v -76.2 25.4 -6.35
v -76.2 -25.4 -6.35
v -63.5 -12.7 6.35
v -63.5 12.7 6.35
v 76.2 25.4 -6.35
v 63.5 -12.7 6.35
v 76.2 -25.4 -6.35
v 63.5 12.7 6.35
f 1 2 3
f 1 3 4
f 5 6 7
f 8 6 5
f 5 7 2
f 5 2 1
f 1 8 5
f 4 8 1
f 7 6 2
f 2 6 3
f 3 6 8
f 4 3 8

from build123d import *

# Parameters (mm, degrees)
F0_W     = 50.8
F0_H     = 12.7
F1_DEPTH = 76.2
F2_SIZE  = 12.69999


# Not quite as in the source:
# - a fillet or chamfer is up to 0.001 mm smaller than in the source, because OpenCascade refuses the exact size


with BuildPart() as f1:
    # F0 (on Right) → F1 (new body, symmetric)
    with BuildSketch(Plane.YZ):
        Rectangle(F0_W, F0_H)
    extrude(amount=F1_DEPTH, both=True)

    # F2 (size 12.7 in the source; OpenCascade refuses exactly that, so slightly less here)
    f2_edges = [f1.edges().sort_by_distance(p)[0] for p in [
        (0, 25.4, 6.35),
        (-76.2, 0, 6.35),
        (0, -25.4, 6.35),
        (76.2, 0, 6.35),
    ]]
    chamfer(f2_edges, length=F2_SIZE)


solid = f1.part
